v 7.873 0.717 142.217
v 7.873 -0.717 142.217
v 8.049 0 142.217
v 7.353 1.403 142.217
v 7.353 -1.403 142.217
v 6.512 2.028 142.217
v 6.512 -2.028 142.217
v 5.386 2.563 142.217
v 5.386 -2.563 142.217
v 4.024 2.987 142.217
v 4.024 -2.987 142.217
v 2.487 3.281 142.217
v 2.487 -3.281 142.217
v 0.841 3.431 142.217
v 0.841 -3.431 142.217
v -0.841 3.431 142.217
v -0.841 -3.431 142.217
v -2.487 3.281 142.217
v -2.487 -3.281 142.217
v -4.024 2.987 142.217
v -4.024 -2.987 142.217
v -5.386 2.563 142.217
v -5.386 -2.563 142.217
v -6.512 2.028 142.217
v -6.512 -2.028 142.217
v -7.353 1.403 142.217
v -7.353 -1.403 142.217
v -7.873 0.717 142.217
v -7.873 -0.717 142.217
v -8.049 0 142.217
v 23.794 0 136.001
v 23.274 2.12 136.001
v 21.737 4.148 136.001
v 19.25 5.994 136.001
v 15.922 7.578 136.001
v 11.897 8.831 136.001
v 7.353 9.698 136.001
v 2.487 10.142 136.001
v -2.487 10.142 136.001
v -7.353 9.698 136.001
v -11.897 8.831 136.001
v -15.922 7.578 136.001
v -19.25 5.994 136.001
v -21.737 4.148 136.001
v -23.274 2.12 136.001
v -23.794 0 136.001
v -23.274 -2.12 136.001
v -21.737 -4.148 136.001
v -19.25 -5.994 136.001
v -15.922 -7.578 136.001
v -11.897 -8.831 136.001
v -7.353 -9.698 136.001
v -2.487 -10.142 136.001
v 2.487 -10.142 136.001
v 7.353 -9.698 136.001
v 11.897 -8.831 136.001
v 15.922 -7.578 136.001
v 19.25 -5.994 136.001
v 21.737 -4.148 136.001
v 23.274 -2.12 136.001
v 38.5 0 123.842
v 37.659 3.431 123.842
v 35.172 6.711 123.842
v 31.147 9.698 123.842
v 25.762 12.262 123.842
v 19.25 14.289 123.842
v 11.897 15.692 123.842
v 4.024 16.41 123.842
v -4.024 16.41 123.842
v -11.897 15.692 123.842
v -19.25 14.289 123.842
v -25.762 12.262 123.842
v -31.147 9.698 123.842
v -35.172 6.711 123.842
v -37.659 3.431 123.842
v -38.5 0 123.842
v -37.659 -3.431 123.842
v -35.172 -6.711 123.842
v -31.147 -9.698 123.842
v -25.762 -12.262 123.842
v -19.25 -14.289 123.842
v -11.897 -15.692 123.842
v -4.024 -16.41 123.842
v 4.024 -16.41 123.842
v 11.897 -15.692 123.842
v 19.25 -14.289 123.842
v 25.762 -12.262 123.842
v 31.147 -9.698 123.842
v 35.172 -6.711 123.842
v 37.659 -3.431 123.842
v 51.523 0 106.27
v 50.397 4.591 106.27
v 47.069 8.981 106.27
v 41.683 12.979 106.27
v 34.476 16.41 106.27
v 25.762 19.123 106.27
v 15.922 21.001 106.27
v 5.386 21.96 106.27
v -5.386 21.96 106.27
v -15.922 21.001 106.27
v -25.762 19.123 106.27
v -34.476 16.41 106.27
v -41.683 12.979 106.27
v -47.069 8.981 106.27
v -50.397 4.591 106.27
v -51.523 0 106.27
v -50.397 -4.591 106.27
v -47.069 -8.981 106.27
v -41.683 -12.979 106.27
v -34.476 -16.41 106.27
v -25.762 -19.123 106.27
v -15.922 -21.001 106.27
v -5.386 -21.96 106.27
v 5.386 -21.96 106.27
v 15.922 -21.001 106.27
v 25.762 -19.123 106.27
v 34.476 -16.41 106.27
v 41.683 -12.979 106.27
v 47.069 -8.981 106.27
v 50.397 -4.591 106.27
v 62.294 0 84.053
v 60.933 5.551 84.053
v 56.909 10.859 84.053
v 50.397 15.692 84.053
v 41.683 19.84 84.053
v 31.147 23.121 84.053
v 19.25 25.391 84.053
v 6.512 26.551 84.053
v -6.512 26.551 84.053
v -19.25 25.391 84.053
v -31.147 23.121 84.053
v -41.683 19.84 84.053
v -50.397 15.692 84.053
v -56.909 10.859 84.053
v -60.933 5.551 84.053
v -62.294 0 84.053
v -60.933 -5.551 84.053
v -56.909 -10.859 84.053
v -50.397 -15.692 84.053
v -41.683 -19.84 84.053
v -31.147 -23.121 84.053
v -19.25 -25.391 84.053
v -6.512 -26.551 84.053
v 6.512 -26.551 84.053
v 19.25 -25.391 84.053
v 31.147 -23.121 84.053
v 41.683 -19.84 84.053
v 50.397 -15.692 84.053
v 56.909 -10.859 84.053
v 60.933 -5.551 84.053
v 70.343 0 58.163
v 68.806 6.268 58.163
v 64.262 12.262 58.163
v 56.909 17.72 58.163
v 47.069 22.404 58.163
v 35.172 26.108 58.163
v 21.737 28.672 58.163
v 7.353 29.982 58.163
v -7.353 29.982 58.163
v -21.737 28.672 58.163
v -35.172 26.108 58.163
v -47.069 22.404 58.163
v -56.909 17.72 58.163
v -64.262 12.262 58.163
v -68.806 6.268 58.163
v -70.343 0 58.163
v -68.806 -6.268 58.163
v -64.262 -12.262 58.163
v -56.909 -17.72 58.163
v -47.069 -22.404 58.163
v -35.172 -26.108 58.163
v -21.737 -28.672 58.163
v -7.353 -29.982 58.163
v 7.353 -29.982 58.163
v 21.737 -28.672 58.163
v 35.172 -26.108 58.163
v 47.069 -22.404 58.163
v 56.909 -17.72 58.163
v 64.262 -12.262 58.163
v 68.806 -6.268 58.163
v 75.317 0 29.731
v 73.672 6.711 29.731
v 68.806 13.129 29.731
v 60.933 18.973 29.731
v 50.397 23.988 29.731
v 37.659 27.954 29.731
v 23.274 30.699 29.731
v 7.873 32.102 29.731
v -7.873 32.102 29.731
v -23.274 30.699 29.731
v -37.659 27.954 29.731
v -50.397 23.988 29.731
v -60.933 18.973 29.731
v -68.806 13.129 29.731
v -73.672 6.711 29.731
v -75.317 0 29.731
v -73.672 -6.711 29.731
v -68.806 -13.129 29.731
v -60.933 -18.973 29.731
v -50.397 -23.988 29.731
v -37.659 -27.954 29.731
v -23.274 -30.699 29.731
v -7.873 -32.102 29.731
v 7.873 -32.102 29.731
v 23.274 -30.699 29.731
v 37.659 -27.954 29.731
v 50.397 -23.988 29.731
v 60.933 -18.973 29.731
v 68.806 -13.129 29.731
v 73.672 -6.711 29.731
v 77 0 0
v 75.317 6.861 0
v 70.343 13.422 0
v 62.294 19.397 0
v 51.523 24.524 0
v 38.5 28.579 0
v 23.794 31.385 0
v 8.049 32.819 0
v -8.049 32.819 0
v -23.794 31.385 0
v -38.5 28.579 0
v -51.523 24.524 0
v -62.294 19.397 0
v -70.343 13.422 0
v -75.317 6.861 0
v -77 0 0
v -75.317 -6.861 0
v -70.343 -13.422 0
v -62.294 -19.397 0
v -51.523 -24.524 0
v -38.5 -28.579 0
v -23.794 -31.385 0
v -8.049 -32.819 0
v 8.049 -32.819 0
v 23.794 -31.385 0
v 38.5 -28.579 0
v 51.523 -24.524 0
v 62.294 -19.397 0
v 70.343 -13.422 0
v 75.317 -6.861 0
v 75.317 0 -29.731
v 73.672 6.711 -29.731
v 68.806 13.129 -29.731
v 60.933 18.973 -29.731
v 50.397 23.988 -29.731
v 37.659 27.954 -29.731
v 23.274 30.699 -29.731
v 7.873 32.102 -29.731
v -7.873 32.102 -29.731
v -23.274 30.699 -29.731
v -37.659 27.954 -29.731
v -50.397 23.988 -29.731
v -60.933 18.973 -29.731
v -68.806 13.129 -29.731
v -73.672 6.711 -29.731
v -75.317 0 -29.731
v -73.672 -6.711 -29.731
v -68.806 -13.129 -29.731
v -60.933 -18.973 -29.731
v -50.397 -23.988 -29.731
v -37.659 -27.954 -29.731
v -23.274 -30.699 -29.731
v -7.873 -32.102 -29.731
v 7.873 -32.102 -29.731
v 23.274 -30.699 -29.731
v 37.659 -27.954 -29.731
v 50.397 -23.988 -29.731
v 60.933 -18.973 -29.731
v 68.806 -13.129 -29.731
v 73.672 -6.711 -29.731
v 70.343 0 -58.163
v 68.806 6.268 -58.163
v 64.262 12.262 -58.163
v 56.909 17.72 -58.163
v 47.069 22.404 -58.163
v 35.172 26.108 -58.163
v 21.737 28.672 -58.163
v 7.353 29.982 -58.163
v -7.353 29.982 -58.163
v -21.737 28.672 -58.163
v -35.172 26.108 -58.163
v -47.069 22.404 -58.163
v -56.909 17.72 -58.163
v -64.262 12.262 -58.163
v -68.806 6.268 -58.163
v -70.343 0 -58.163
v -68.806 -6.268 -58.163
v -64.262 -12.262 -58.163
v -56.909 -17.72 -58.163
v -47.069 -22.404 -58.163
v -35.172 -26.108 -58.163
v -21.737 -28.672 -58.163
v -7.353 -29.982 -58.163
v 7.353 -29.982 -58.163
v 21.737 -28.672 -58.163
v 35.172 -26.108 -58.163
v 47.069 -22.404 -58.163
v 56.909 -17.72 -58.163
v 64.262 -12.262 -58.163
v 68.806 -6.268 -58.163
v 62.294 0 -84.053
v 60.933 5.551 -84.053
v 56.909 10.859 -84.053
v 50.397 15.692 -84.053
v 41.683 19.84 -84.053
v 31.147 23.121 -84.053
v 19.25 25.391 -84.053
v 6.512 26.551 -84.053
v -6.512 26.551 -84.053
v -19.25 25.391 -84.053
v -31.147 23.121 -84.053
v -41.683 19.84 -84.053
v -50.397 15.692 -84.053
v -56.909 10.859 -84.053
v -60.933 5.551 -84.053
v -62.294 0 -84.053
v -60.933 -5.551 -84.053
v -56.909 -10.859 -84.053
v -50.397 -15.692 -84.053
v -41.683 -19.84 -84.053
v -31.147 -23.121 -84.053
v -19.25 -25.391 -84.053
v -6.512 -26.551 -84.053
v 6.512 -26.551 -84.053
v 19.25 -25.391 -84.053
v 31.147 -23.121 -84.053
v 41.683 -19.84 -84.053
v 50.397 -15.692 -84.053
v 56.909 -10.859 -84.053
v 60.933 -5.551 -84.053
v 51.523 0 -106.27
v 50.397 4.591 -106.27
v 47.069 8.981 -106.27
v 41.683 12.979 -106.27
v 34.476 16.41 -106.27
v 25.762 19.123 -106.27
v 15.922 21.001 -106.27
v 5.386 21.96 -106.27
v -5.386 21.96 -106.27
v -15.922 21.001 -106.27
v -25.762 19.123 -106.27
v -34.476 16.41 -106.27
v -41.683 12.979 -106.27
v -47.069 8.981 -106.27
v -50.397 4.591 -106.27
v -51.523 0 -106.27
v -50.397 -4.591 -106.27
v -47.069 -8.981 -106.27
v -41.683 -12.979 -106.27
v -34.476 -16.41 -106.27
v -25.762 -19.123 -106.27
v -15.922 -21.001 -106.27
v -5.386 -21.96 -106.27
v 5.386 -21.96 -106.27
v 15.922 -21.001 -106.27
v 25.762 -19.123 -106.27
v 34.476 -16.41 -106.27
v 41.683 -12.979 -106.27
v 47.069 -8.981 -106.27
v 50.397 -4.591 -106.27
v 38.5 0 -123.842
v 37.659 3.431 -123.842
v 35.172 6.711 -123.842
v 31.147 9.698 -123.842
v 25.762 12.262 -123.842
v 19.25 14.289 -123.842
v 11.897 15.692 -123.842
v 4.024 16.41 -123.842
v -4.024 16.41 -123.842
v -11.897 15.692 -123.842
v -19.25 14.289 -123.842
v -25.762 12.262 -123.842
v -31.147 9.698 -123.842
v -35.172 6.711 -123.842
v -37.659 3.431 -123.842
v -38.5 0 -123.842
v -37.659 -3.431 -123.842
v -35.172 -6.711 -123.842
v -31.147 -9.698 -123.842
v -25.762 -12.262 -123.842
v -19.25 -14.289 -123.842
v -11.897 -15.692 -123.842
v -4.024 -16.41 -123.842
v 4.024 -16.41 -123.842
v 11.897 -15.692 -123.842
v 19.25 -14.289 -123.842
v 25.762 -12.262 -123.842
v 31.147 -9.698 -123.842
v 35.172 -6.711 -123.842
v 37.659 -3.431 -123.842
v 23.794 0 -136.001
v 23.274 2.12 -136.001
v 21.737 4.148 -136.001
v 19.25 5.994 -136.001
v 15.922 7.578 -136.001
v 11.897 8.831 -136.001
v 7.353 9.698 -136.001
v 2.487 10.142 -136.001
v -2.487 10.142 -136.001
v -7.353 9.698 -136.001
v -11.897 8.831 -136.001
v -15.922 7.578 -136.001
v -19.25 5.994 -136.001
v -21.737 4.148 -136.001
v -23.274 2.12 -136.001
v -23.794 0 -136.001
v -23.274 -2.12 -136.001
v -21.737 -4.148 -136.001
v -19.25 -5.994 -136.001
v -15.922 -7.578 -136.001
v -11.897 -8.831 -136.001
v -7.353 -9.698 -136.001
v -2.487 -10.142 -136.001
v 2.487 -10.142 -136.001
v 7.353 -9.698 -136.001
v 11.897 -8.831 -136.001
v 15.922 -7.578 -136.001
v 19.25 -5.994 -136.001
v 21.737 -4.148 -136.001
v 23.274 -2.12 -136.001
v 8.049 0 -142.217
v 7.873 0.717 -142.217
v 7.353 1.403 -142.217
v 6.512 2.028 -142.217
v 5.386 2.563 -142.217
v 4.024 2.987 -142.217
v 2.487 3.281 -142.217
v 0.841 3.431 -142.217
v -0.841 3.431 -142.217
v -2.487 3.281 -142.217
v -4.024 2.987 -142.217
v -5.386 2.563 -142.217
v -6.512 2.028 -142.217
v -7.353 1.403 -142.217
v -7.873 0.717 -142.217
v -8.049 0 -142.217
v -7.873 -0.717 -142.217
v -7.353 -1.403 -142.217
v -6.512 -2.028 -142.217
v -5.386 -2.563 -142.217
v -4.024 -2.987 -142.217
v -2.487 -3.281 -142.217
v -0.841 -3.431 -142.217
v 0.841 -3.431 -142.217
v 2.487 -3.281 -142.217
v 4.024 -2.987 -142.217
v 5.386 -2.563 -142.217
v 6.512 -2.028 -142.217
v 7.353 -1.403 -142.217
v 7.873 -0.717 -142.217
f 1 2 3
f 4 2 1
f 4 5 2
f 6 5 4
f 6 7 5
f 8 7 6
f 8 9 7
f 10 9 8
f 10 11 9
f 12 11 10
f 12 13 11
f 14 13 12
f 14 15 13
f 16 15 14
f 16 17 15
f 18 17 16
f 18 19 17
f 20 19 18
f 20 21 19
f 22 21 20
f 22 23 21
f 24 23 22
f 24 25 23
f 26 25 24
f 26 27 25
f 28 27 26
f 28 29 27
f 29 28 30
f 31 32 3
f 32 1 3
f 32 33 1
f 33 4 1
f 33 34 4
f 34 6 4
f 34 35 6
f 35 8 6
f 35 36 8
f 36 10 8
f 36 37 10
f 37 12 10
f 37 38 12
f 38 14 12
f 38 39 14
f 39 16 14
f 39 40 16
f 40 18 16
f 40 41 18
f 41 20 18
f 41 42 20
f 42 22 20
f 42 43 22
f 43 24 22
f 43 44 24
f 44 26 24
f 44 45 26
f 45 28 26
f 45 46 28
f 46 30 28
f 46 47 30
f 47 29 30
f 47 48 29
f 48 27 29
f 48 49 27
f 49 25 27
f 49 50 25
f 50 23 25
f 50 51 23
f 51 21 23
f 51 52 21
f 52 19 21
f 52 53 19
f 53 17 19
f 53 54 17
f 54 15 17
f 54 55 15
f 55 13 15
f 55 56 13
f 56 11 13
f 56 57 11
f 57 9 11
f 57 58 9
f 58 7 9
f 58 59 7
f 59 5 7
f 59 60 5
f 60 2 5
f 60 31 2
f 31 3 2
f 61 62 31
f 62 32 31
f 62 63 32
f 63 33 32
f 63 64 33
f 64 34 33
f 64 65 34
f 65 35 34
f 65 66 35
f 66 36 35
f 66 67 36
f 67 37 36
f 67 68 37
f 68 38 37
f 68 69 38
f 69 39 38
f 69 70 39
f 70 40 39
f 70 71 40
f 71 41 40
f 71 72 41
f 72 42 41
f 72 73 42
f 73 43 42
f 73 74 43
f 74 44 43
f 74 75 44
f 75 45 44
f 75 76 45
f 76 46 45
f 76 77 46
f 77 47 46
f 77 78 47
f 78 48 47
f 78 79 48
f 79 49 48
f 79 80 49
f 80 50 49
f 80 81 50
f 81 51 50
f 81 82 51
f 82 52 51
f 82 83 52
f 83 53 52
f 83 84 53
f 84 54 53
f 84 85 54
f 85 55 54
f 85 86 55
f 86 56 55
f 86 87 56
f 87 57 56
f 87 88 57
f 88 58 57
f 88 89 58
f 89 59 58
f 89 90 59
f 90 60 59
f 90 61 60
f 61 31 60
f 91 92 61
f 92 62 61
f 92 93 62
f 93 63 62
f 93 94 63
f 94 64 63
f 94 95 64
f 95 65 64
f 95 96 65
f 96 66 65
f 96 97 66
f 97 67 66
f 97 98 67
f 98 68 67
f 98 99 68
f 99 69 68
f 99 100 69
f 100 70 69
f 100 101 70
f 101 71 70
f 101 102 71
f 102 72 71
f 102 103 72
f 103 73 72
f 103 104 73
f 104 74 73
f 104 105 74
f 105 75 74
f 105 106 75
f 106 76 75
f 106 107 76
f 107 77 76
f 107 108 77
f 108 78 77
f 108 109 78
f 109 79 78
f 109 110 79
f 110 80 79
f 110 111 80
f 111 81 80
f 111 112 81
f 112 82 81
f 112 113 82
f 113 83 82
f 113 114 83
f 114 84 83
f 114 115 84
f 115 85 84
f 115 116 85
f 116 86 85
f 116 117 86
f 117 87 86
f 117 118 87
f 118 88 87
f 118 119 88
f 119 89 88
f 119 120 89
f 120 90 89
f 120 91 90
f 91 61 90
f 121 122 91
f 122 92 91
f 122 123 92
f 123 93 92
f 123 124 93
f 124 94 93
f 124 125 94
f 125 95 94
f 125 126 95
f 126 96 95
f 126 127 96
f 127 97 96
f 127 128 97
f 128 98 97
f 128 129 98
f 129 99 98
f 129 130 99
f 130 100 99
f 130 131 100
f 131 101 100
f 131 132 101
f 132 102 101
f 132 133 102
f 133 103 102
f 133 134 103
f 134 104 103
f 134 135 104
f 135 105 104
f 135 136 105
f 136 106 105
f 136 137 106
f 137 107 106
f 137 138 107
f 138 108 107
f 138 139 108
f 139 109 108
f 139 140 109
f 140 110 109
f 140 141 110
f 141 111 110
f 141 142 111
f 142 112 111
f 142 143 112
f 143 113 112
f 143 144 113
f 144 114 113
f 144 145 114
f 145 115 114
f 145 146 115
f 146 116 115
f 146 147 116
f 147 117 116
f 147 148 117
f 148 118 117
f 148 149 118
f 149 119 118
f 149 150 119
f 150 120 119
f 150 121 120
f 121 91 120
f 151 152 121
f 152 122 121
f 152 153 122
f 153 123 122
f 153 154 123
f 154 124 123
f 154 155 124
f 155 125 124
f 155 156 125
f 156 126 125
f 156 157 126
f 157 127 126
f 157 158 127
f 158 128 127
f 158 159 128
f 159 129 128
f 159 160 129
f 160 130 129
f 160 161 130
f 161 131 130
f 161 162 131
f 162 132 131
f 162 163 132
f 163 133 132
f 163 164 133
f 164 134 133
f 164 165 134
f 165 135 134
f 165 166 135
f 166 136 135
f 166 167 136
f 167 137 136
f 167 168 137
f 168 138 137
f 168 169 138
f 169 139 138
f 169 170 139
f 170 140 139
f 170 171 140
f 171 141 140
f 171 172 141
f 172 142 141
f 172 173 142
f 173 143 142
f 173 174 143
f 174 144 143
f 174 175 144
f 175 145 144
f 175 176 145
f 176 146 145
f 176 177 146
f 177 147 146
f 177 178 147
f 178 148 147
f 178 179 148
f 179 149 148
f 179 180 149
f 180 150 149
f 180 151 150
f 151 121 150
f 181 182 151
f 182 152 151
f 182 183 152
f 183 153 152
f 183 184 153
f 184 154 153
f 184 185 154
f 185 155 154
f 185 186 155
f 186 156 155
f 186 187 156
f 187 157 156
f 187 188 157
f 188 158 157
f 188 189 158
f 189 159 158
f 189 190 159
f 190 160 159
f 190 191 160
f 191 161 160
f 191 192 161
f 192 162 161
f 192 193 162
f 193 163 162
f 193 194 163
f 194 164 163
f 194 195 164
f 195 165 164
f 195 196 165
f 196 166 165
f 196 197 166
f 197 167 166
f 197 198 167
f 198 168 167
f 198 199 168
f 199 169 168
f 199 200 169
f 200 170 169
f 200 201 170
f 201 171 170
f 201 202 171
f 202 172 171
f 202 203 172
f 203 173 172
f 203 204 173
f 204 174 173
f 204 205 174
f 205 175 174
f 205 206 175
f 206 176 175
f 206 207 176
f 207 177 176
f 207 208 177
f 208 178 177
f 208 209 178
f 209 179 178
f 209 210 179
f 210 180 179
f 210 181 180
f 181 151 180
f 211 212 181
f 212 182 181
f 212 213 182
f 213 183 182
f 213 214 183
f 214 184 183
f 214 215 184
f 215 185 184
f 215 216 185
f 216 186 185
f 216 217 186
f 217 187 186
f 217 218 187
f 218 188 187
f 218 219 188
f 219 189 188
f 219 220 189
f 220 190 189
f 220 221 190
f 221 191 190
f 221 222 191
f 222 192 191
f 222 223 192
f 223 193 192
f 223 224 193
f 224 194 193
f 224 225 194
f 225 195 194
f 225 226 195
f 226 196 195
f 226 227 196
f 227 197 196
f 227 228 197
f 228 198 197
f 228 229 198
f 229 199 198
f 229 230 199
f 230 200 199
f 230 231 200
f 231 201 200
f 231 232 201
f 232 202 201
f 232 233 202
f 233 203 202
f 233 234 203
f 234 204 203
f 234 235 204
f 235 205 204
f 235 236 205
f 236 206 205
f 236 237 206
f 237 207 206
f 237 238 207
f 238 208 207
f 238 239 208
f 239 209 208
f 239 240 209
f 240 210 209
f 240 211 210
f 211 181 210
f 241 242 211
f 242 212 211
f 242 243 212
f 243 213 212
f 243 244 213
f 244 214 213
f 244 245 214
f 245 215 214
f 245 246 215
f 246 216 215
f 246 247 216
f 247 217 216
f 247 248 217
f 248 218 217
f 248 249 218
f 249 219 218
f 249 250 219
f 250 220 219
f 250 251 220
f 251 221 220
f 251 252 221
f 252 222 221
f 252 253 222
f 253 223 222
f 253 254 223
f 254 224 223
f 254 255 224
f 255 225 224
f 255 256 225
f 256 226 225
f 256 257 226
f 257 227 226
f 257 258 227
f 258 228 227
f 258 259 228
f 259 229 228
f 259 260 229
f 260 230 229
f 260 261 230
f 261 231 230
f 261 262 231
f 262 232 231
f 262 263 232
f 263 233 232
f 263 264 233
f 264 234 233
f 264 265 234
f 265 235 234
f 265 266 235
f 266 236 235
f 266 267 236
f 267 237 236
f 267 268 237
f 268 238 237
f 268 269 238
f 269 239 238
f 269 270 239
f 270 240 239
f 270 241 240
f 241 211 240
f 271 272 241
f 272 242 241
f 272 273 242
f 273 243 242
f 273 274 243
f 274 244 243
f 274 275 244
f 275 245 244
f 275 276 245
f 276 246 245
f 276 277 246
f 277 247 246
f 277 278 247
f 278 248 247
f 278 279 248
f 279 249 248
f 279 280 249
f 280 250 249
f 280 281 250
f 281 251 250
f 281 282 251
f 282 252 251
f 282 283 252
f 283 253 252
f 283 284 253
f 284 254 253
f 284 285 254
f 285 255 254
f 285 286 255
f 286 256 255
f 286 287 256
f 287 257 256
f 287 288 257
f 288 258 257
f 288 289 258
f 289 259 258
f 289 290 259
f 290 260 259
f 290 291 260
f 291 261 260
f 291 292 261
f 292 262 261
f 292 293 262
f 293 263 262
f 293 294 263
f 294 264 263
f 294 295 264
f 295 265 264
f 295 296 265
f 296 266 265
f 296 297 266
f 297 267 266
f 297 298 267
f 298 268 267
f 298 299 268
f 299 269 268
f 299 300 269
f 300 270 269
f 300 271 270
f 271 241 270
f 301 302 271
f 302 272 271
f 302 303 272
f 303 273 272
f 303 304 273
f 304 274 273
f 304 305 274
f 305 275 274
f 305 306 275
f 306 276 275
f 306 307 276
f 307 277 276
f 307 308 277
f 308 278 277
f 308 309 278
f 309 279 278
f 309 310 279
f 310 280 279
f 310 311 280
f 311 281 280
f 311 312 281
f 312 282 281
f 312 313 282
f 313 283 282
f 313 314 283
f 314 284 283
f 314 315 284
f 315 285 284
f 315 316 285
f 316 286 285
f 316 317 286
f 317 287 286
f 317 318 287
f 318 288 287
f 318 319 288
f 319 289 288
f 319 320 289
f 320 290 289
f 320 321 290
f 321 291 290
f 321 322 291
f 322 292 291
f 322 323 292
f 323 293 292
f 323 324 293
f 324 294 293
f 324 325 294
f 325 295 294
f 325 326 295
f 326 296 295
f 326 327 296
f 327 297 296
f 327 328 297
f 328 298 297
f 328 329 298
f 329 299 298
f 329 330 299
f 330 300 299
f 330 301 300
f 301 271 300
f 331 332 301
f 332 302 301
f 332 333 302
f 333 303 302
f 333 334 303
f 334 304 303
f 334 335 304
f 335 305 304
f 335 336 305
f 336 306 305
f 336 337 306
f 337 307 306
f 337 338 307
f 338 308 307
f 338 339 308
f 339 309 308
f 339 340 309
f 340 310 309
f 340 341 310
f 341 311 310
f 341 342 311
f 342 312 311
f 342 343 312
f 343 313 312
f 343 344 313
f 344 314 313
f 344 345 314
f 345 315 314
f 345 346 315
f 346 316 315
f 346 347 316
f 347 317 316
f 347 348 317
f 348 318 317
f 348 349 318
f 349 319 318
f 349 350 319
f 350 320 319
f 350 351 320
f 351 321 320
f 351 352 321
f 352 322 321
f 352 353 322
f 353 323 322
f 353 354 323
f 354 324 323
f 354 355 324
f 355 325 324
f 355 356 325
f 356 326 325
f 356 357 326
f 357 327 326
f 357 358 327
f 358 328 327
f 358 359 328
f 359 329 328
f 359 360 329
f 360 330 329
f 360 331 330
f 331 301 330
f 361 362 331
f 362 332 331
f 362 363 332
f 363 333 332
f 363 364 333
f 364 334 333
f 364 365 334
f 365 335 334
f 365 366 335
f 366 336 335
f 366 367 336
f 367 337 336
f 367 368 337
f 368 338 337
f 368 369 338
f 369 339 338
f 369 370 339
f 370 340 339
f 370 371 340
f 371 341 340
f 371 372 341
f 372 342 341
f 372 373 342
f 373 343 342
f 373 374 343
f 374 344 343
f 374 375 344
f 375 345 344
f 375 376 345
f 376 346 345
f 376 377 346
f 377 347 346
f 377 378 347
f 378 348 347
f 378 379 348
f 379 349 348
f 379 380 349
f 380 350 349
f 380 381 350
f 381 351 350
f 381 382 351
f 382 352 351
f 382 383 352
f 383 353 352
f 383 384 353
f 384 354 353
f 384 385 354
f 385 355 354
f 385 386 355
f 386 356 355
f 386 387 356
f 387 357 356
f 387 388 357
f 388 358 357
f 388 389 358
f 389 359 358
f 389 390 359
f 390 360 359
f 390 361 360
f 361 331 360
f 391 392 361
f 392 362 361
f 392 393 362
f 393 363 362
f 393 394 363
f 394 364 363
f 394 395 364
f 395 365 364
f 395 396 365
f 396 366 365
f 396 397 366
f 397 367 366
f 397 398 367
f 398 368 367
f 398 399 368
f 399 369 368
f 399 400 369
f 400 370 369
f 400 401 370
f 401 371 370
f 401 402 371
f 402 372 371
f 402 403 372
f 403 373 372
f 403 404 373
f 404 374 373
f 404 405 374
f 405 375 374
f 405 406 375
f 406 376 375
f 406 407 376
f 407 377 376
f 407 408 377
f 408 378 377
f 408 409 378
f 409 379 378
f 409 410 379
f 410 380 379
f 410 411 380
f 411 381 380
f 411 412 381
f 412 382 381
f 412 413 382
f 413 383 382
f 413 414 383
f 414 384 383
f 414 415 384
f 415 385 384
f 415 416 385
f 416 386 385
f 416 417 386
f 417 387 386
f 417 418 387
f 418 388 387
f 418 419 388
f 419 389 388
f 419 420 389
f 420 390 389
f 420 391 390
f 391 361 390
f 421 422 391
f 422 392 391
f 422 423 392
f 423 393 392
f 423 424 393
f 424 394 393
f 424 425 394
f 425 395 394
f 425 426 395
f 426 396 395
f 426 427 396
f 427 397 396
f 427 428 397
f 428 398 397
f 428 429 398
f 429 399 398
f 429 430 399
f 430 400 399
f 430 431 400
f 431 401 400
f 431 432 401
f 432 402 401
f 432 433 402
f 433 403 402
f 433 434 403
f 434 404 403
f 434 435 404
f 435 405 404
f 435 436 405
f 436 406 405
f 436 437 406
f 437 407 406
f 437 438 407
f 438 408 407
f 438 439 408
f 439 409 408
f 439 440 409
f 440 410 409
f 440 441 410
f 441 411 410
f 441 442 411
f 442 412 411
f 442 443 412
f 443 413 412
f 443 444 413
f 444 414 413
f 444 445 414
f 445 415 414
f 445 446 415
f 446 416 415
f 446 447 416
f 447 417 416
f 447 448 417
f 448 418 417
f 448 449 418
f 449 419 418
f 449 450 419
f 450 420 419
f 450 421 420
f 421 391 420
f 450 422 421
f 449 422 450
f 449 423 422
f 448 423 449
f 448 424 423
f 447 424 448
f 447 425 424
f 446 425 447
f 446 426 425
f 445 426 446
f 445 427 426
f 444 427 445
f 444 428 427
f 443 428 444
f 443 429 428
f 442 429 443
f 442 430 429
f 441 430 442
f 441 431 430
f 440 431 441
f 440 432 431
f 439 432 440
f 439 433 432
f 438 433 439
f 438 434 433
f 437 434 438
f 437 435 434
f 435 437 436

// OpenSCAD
// Generated by SolidPython 1.0.1 on 2020-07-29 00:46:47


scale(v = [7, 3, 13]) {
	sphere(r = 11);
}
/***********************************************
*********      SolidPython code:      **********
************************************************
 
# import packages: SolidPython
from solid import *
from solid.utils import *
from itertools import chain, combinations, permutations


class Resize:

    def __init__(self, scad_file):
        self.scad_file = scad_file
        #self.scad_file = import_scad(scad_file)
        # cone/cylinder param:
        self.r1 = 0
        self.r2 = 0
        self.h = 0
        # rectangular prism param:
        self.w = 0
        self.l = 0
        # ellipse param:
        self.r = 0

    # import OpenScad code (file name corresponds to shape)


    # classify shape + parameters
    def assign(self, param1, param2, param3):
        if self.scad_file == 'cone.scad':
            self.r1 = param1
            self.r2 = param2
            self.h = param3
        elif self.scad_file == 'cylinder.scad':
            self.r1 = param1
            self.r2 = param2
            self.h = param3
        elif self.scad_file == 'rectangularPrism.scad':
            self.h = param1
            self.l = param2
            self.w = param3
        else:
            self.r = param1
            self.h = param2

    # resize parameters
    def iterate(self):
        x = range(3, 20, 2)
        i = 1
        if self.scad_file == 'cone.scad':
            tempList = list(permutations(x, 2))
            for temp in tempList:
                param1 = temp[0]
                param2 = temp[1]
                filepath = 'produced_scad_files/' + 'cone' + str(param1) + '_' + str(param2) + '_' + '.scad'
                scad_render_to_file(cylinder(h=param1, r1=param2, r2=0), filepath)

        elif self.scad_file == 'cylinder.scad':
            tempList = list(permutations(x, 3))
            for temp in tempList:
                param1 = temp[0]
                param2 = temp[1]
                filepath = 'produced_scad_files/' + 'cylinder' + str(param1) + '_' + str(param2) + '_' + '.scad'
                scad_render_to_file(cylinder(h=param1, r1=param2, r2=param2), filepath)

        elif self.scad_file == 'rectangularPrism.scad':
            tempList = list(permutations(x, 3))
            for temp in tempList:
                param1 = temp[0]
                param2 = temp[1]
                param3 = temp[2]
                filepath = 'produced_scad_files/' + 'rectangularPrism' + str(param1) + '_' + str(param2) + '_' + str(
                    param3) + '.scad'
                scad_render_to_file(cube(size=(param1, param2, param3)), filepath)

        elif self.scad_file == 'ellipse.scad':
            tempList = list(permutations(x, 4))
            for temp in tempList:
                param1 = temp[0]
                param2 = temp[1]
                param3 = temp[2]
                param4 = temp[3]
                filepath = 'produced_scad_files/' + 'ellipse' + str(param1) + '_' + str(param2) + '_' + str(param3) + '_' + str(param4) + '.scad'
                scad_render_to_file(scale([param1, param2, param3])(sphere(r=param4)), filepath)

    def render_to_scadfile(self):
        scad_render_to_file(scad, 'example.scad') 
 
************************************************/
